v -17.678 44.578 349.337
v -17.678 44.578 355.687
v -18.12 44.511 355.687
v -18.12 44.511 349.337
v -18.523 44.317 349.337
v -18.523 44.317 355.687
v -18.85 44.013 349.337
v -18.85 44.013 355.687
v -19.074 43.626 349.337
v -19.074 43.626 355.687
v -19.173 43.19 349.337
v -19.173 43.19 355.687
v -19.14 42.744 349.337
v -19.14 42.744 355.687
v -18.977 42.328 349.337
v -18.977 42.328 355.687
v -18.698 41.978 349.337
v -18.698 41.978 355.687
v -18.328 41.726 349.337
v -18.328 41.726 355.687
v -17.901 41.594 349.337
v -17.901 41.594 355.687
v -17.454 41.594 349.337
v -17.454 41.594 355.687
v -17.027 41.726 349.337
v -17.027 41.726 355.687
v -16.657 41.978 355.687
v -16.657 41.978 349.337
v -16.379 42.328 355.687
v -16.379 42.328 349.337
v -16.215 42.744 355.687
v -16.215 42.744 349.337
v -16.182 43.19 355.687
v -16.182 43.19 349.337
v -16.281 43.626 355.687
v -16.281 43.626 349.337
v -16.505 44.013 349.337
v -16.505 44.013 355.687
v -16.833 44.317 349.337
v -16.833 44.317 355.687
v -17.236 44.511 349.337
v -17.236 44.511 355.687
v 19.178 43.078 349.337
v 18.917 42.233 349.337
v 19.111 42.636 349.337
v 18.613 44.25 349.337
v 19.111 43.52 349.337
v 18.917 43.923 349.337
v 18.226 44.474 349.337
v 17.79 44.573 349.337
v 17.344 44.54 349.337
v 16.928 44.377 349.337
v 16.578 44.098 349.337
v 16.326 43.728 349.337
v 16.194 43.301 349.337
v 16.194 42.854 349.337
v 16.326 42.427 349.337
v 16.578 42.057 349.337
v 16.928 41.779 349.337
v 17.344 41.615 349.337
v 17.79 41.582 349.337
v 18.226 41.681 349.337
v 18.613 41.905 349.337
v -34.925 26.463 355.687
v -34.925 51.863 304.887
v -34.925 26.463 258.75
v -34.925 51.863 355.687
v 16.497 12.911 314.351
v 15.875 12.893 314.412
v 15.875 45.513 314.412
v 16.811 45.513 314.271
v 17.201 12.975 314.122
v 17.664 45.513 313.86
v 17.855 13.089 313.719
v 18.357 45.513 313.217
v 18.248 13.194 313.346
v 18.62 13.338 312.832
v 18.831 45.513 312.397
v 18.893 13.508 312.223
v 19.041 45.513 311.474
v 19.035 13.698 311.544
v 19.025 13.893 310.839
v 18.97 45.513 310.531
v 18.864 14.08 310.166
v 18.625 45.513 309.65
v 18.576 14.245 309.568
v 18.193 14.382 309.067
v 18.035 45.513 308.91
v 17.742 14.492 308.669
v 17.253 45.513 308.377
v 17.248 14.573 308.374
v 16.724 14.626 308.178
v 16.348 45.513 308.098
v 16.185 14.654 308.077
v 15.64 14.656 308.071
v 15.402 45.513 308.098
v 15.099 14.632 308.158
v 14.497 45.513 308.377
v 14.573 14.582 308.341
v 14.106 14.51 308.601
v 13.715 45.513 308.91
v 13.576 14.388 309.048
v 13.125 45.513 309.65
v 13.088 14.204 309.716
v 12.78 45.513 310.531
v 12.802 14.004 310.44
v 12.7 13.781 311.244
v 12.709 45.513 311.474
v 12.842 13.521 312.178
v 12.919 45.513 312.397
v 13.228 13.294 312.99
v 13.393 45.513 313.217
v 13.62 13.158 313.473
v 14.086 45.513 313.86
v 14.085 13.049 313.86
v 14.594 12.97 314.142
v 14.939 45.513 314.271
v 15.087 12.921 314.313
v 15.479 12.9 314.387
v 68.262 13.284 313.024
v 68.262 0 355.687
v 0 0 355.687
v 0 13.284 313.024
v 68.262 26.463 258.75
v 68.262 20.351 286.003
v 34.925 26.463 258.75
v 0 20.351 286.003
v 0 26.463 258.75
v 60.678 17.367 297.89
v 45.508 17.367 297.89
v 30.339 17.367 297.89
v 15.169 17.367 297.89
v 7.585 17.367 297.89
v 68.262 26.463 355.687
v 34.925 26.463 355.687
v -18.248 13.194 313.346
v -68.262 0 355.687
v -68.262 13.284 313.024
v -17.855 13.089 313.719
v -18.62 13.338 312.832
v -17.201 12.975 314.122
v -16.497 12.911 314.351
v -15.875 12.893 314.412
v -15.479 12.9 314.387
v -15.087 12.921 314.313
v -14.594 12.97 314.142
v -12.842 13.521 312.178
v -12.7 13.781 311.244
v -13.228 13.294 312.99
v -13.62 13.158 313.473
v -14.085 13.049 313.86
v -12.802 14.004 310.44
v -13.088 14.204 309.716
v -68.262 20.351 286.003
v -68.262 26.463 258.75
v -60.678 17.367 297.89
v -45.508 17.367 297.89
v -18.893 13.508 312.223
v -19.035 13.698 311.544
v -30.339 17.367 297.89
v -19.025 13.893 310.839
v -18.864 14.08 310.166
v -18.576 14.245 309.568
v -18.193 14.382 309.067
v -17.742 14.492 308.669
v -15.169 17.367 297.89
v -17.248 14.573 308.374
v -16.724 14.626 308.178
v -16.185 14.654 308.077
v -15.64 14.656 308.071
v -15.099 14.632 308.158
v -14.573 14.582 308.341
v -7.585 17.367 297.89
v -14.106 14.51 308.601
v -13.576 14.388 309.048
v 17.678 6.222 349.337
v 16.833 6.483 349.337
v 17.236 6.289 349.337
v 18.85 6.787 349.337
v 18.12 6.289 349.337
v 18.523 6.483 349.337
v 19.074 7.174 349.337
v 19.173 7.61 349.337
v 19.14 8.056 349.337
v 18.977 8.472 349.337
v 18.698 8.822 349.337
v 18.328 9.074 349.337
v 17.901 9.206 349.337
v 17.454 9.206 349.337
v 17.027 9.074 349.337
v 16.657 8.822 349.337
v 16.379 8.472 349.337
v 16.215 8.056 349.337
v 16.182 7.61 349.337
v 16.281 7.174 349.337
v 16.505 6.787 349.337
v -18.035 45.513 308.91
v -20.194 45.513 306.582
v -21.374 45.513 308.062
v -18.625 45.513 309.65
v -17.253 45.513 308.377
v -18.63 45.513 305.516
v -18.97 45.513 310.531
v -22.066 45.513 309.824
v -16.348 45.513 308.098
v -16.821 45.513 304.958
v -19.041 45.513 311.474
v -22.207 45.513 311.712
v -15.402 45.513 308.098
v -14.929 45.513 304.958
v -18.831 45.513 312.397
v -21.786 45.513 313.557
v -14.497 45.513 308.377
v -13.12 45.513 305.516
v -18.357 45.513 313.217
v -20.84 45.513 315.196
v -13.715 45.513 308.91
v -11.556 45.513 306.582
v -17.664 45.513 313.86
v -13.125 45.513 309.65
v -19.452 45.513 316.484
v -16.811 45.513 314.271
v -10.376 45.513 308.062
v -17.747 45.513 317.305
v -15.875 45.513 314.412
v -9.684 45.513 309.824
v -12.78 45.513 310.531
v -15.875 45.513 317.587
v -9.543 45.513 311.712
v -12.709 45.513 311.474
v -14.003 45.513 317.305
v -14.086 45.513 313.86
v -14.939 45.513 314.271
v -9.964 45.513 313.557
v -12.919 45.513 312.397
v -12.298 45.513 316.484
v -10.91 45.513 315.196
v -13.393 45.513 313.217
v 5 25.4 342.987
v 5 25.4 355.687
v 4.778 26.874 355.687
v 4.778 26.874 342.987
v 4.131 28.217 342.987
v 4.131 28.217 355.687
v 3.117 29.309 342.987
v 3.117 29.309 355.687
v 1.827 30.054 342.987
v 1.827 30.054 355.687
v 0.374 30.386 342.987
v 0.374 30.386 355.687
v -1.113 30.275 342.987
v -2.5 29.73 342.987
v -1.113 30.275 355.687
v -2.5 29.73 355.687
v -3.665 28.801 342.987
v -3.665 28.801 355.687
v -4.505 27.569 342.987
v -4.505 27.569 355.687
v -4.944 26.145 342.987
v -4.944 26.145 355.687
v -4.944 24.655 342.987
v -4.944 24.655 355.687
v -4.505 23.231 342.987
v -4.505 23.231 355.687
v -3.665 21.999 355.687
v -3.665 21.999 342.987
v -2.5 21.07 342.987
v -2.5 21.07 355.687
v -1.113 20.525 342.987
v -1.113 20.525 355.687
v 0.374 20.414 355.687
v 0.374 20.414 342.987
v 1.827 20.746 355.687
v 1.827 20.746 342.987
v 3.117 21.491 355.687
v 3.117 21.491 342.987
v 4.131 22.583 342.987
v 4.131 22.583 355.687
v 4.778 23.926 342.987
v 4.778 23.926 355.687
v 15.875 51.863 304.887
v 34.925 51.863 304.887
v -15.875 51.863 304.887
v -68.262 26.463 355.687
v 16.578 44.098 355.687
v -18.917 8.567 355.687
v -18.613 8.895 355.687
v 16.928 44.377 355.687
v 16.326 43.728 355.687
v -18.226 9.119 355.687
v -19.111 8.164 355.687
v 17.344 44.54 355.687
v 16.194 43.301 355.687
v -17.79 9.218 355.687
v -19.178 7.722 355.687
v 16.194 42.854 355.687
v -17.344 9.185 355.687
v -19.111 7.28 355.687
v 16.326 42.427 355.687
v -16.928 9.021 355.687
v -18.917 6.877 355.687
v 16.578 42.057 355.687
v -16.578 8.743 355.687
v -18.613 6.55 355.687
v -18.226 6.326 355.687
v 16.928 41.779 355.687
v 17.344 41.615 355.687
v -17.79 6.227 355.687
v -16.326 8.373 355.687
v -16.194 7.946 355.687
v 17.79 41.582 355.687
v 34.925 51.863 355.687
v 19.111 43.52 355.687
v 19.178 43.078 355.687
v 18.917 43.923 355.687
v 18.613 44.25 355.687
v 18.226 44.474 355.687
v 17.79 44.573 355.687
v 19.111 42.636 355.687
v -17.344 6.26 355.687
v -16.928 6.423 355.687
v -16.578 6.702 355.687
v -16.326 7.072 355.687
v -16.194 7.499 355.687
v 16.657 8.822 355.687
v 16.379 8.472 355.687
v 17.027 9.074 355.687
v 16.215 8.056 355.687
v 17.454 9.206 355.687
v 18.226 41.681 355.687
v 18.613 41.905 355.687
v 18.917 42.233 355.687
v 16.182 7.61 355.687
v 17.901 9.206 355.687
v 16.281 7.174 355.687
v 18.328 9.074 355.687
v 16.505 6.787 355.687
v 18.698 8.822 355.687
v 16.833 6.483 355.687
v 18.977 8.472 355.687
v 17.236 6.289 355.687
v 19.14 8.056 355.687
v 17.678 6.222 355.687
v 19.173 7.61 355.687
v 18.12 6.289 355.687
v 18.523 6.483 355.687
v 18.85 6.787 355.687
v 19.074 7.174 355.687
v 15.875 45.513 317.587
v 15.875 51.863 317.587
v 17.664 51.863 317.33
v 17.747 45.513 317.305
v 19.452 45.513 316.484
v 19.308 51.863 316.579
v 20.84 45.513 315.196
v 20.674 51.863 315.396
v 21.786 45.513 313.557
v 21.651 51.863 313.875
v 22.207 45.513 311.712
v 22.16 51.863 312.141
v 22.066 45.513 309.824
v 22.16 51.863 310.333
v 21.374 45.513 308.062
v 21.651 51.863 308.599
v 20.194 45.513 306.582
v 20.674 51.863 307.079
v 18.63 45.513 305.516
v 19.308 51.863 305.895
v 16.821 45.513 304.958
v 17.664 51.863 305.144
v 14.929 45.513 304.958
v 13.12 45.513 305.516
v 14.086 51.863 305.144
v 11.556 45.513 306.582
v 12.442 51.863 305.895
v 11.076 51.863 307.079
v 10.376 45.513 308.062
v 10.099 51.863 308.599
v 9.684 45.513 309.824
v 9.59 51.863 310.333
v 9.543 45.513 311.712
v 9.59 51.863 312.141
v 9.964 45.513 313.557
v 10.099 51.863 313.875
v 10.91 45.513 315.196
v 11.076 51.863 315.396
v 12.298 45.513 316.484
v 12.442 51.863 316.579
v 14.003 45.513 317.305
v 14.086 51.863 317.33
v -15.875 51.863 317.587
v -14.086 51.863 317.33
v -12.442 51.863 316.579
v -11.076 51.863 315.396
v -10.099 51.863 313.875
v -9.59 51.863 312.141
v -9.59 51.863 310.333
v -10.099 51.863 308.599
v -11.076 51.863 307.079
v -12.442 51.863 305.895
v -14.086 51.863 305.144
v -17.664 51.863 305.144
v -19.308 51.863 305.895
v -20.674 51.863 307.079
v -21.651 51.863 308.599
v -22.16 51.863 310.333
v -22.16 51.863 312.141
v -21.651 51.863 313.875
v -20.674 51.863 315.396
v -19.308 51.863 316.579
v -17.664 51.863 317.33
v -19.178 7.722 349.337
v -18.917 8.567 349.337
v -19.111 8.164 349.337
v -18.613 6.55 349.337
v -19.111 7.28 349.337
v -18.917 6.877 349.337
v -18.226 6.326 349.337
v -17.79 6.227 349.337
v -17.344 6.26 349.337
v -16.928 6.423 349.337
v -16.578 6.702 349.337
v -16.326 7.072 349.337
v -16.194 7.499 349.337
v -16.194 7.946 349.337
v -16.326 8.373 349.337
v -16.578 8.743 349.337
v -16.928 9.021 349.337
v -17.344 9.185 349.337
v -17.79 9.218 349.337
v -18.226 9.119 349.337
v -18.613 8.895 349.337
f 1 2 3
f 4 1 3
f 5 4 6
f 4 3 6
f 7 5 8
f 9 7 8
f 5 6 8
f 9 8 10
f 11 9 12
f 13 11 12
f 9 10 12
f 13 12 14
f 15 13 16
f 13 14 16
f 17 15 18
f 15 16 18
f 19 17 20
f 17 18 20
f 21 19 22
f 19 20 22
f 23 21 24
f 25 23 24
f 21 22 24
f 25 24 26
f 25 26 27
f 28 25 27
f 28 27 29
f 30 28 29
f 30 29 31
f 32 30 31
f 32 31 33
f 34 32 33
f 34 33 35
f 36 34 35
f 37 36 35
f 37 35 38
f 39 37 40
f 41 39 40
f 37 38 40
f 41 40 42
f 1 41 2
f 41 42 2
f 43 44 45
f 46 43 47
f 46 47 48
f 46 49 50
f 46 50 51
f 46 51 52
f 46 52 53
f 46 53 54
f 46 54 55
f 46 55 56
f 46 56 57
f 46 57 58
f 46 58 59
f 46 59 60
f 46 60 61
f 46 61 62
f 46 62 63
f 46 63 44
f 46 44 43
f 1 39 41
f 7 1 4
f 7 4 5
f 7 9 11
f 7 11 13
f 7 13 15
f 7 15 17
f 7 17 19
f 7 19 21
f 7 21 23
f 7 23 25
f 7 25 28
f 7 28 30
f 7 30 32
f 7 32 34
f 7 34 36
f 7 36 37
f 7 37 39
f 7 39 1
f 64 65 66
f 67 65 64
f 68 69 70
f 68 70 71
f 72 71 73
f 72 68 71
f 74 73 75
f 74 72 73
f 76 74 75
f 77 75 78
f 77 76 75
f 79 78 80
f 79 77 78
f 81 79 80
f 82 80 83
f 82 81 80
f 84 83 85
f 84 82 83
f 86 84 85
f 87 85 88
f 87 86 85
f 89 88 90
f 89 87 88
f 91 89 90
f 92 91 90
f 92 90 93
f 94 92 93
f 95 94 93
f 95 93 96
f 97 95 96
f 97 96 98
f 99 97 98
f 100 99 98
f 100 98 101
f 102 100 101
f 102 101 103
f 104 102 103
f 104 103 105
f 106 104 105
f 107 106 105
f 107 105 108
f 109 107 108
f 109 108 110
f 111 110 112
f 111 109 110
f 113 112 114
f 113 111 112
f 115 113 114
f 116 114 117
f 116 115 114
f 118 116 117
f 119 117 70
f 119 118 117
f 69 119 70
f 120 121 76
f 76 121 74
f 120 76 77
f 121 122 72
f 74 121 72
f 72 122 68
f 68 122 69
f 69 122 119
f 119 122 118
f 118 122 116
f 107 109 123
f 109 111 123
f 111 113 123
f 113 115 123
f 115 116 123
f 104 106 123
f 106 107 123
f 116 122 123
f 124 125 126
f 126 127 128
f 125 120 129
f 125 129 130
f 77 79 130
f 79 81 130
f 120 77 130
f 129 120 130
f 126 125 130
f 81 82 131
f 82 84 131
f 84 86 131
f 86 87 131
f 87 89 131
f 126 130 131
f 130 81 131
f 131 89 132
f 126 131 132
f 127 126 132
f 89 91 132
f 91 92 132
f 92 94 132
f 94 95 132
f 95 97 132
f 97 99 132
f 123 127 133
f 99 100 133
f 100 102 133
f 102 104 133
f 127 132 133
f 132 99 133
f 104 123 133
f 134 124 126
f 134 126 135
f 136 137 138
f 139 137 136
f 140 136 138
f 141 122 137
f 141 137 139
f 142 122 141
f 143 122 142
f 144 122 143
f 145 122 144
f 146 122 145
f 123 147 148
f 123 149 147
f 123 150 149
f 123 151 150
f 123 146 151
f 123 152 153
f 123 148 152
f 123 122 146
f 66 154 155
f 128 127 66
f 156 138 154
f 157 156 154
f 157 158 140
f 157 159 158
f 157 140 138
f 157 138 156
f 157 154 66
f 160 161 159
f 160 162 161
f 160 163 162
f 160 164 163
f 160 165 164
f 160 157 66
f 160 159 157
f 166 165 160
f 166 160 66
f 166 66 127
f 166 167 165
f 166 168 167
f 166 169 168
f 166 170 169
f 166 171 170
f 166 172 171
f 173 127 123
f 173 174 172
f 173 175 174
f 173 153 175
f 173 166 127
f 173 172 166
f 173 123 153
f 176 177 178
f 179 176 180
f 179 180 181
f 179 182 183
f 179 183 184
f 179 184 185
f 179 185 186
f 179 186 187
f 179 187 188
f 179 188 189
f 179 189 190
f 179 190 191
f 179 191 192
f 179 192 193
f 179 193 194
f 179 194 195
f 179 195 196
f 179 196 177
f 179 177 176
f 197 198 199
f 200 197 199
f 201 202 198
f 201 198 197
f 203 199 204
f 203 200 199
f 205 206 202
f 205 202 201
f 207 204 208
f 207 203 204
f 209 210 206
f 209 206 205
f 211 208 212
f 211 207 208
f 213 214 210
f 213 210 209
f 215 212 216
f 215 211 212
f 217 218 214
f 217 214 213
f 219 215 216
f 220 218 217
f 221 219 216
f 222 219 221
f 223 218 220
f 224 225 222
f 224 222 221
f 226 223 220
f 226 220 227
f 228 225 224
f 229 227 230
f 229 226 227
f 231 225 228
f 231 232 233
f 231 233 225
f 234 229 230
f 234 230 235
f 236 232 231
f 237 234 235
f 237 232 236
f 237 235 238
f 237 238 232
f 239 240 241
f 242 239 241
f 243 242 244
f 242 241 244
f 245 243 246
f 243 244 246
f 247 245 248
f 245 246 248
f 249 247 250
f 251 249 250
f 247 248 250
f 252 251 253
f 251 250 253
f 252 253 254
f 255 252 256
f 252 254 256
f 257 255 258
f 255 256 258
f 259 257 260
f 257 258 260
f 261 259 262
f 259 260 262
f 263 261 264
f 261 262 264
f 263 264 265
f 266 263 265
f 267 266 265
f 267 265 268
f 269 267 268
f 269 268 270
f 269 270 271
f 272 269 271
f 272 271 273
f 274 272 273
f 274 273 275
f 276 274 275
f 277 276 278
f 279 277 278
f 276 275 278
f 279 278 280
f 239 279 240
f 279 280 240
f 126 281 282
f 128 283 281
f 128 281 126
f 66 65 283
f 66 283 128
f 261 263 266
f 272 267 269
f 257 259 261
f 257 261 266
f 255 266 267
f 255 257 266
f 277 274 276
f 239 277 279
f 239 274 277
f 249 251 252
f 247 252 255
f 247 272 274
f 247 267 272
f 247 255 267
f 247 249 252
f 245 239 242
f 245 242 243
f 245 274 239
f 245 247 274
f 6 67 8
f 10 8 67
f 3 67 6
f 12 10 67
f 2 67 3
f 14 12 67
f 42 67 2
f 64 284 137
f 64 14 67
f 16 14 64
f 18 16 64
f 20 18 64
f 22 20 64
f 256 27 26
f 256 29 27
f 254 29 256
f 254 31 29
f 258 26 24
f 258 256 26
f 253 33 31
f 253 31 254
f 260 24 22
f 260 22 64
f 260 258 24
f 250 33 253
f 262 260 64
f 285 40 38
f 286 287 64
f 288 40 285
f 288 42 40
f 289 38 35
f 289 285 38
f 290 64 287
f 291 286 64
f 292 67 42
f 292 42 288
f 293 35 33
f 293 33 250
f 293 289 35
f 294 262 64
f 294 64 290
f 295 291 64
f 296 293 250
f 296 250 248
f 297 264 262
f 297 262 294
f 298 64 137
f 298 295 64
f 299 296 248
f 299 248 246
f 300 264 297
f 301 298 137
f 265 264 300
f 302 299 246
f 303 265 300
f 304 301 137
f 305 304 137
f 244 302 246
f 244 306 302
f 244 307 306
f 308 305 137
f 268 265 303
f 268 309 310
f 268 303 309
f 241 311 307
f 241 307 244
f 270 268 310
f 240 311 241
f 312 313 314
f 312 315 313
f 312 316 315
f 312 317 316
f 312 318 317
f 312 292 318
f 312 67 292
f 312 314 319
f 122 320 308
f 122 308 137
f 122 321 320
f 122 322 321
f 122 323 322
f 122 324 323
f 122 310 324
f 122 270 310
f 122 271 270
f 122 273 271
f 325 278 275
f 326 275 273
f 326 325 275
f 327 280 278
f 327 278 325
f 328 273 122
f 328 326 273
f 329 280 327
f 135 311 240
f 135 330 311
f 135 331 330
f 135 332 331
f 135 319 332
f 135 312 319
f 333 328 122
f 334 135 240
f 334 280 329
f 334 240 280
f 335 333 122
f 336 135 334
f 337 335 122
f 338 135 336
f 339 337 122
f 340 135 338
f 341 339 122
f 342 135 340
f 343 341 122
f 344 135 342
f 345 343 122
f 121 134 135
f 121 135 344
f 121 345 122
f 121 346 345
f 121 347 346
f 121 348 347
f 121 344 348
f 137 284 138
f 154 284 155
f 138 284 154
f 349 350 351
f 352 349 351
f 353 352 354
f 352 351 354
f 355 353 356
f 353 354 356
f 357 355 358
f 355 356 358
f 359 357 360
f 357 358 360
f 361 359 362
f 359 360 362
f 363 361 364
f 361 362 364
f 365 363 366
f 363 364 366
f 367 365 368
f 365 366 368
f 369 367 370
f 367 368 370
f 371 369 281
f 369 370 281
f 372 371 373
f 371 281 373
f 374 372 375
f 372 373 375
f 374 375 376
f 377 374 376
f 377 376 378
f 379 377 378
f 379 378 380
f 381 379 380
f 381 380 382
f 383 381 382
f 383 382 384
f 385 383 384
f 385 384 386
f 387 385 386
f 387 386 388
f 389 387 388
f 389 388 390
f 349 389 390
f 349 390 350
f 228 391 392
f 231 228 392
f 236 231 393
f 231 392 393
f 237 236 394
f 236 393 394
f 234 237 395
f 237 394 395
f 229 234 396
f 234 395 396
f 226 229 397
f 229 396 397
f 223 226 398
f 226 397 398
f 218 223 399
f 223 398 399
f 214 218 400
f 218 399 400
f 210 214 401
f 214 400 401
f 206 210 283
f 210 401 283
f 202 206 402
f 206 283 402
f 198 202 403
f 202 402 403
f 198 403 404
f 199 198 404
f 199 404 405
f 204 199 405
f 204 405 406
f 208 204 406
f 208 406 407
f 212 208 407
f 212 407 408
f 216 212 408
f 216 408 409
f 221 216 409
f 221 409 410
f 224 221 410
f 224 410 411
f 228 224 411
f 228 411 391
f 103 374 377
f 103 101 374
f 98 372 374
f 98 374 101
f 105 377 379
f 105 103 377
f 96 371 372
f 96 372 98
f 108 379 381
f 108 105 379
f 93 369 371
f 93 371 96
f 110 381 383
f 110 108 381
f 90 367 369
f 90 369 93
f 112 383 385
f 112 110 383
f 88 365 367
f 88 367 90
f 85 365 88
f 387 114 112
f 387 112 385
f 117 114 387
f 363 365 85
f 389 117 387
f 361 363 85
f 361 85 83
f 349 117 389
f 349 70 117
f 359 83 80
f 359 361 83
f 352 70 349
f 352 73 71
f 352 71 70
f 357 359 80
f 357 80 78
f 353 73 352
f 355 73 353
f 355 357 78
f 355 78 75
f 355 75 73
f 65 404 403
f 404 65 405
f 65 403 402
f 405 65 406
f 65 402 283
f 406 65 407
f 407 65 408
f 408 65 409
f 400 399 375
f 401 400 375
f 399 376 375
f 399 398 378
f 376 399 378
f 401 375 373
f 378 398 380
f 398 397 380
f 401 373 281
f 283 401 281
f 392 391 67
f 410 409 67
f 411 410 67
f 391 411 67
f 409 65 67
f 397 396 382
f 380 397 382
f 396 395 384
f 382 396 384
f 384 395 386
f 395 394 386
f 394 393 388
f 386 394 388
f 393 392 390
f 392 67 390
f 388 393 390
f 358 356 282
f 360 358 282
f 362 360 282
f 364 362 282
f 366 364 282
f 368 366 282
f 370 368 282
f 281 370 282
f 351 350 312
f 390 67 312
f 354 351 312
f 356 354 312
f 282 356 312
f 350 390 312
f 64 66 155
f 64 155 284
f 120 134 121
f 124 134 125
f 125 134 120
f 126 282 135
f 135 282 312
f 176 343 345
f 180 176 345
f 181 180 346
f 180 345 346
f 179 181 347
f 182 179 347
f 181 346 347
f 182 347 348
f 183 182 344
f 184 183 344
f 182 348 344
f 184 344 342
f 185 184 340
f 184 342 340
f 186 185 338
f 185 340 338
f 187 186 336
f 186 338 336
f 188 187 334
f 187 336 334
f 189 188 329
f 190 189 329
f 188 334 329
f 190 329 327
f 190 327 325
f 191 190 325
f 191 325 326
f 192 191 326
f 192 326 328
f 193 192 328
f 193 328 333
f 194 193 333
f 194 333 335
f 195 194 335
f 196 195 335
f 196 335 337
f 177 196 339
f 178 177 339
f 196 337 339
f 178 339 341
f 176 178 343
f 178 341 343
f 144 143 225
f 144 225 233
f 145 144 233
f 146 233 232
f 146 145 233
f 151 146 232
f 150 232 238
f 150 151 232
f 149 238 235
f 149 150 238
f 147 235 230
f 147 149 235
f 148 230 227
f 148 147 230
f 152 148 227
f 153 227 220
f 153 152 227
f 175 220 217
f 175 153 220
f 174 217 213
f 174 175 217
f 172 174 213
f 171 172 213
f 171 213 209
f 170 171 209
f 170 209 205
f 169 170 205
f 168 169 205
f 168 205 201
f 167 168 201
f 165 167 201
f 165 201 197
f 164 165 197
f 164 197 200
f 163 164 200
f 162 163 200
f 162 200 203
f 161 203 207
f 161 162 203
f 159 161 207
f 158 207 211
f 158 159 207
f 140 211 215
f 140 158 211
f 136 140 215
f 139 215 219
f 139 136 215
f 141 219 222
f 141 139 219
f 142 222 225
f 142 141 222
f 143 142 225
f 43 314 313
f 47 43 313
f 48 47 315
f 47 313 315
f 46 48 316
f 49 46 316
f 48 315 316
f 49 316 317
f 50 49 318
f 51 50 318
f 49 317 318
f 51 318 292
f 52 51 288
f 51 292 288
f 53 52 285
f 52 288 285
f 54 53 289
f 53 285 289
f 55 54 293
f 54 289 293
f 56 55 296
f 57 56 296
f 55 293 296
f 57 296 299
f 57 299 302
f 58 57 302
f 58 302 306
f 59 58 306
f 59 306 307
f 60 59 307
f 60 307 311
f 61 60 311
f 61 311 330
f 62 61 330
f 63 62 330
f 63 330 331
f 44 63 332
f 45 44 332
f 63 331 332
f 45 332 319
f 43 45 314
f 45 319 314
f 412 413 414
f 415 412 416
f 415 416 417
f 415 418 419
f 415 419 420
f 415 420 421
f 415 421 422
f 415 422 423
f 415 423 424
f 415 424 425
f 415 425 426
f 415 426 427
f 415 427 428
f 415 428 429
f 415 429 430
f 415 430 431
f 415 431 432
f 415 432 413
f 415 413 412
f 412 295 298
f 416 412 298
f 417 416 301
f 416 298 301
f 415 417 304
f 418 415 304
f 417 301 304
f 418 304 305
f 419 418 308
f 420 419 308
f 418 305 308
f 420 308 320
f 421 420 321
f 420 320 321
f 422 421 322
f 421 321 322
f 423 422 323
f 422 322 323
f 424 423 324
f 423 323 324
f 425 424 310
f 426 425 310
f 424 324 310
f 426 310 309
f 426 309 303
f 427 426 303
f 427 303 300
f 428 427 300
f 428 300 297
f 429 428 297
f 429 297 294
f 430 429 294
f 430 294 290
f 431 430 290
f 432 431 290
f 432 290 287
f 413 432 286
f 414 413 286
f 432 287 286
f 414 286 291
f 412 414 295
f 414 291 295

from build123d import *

# Parameters (mm, degrees)
BOSS_EXTRUDE1_DEPTH     = 68.2625
SKETCH4_W               = 69.85
SKETCH4_H               = 25.4
BOSS_EXTRUDE2_DEPTH     = 50.8
CUT_EXTRUDE1_DEPTH      = 364.143790643
CUT_EXTRUDE1_DEPTH_BACK = 364.143790643
SKETCH2_R               = 3.175
SKETCH5_R               = 5
CUT_EXTRUDE2_DEPTH      = 12.7
SKETCH6_R               = 1.5
CUT_EXTRUDE3_DEPTH      = 6.35
CIRPATTERN1_COUNT       = 4
BOSS_EXTRUDE3_DEPTH     = 69.85
SKETCH8_R               = 6.35
CUT_EXTRUDE4_DEPTH      = 6.35


with BuildPart() as part:
    # Sketch1 → Boss-Extrude1 (new, symmetric)
    with BuildSketch(Plane(origin=(0, 0, 0), x_dir=(0, 0, -1), z_dir=(1, 0, 0))):
        with BuildLine():
            Line((-258.749759613, 26.462577976), (-355.687187923, 26.462577976))
            Line((-355.687187923, 26.462577976), (-355.687187923, 0))
            add(Edge.make_bspline(
                [(-355.687187923, 0), (-355.37055154, 0.107976188), (-354.108976481, 0.538185956), (-351.284999827, 1.502859463), (-346.602313416, 3.058862652), (-336.815361237, 6.25189344), (-320.429894612, 11.27779725), (-301.357119069, 16.549630187), (-283.167308194, 21.086195797), (-270.107851124, 24.071552001), (-261.828911243, 25.828285388), (-258.749759613, 26.462577976)],
                knots=[0, 0, 0, 0, 0.001371577, 0.005464776, 0.012234802, 0.021601969, 0.04767125, 0.082496261, 0.102719149, 0.124527079, 0.137415965, 0.137415965, 0.137415965, 0.137415965], degree=3))
        make_face()
    extrude(amount=BOSS_EXTRUDE1_DEPTH, both=True)

    # Sketch4 → Boss-Extrude2 (add)
    with BuildSketch(Plane.XY.offset(355.687187923)):
        with Locations((0, 39.162577976)):
            Rectangle(SKETCH4_W, SKETCH4_H)
    extrude(amount=-BOSS_EXTRUDE2_DEPTH)

    # Sketch2 → Cut-Extrude1 (cut, two sides: drawn at the far end of the back side and taken through both)
    with BuildSketch(Plane(origin=(0, 26.462577976, 0), x_dir=(1, 0, 0), z_dir=(0, 1, 0)).offset(-CUT_EXTRUDE1_DEPTH_BACK)):
        with Locations(Location((-15.875, -311.237187923, 0), (0, 0, 270))):
            Circle(SKETCH2_R)
        with Locations(Location((15.875, -311.237187923, 0), (0, 0, 270))):
            Circle(SKETCH2_R)
    extrude(amount=CUT_EXTRUDE1_DEPTH + CUT_EXTRUDE1_DEPTH_BACK, mode=Mode.SUBTRACT)

    # Sketch5 → Cut-Extrude2 (cut)
    with BuildSketch(Plane.XY.offset(355.687187923)):
        with Locations((0, 25.4)):
            Circle(SKETCH5_R)
    extrude(amount=-CUT_EXTRUDE2_DEPTH, mode=Mode.SUBTRACT)

    # Sketch6 → Cut-Extrude3 (cut)
    with BuildSketch(Plane.XY.offset(355.687187923)):
        with Locations((17.67766953, 43.07766953)):
            Circle(SKETCH6_R)
    cut_extrude3 = extrude(amount=-CUT_EXTRUDE3_DEPTH, mode=Mode.SUBTRACT)

    # CirPattern1: Cut-Extrude3 ×4 about axis
    cirpattern1_axis = Axis((0, 25.4, 0), (0, 0, 1))
    for i in range(1, CIRPATTERN1_COUNT):
        add(cut_extrude3.rotate(cirpattern1_axis, i * 360 / CIRPATTERN1_COUNT), mode=Mode.SUBTRACT)

    # Sketch7 → Boss-Extrude3 (add)
    with BuildSketch(Plane.ZY.offset(34.925)):
        Polygon((304.887187923, 51.862577976), (258.749759613, 26.462577976), (304.887187923, 26.462577976), align=None)
    extrude(amount=-BOSS_EXTRUDE3_DEPTH)

    # Sketch8 → Cut-Extrude4 (cut)
    with BuildSketch(Plane(origin=(0, 51.862577976, 0), x_dir=(1, 0, 0), z_dir=(0, 1, 0))):
        with Locations(Location((15.875, -311.237187923, 0), (0, 0, 270))):
            Circle(SKETCH8_R)
        with Locations(Location((-15.875, -311.237187923, 0), (0, 0, 270))):
            Circle(SKETCH8_R)
    extrude(amount=-CUT_EXTRUDE4_DEPTH, mode=Mode.SUBTRACT)


solid = part.part
